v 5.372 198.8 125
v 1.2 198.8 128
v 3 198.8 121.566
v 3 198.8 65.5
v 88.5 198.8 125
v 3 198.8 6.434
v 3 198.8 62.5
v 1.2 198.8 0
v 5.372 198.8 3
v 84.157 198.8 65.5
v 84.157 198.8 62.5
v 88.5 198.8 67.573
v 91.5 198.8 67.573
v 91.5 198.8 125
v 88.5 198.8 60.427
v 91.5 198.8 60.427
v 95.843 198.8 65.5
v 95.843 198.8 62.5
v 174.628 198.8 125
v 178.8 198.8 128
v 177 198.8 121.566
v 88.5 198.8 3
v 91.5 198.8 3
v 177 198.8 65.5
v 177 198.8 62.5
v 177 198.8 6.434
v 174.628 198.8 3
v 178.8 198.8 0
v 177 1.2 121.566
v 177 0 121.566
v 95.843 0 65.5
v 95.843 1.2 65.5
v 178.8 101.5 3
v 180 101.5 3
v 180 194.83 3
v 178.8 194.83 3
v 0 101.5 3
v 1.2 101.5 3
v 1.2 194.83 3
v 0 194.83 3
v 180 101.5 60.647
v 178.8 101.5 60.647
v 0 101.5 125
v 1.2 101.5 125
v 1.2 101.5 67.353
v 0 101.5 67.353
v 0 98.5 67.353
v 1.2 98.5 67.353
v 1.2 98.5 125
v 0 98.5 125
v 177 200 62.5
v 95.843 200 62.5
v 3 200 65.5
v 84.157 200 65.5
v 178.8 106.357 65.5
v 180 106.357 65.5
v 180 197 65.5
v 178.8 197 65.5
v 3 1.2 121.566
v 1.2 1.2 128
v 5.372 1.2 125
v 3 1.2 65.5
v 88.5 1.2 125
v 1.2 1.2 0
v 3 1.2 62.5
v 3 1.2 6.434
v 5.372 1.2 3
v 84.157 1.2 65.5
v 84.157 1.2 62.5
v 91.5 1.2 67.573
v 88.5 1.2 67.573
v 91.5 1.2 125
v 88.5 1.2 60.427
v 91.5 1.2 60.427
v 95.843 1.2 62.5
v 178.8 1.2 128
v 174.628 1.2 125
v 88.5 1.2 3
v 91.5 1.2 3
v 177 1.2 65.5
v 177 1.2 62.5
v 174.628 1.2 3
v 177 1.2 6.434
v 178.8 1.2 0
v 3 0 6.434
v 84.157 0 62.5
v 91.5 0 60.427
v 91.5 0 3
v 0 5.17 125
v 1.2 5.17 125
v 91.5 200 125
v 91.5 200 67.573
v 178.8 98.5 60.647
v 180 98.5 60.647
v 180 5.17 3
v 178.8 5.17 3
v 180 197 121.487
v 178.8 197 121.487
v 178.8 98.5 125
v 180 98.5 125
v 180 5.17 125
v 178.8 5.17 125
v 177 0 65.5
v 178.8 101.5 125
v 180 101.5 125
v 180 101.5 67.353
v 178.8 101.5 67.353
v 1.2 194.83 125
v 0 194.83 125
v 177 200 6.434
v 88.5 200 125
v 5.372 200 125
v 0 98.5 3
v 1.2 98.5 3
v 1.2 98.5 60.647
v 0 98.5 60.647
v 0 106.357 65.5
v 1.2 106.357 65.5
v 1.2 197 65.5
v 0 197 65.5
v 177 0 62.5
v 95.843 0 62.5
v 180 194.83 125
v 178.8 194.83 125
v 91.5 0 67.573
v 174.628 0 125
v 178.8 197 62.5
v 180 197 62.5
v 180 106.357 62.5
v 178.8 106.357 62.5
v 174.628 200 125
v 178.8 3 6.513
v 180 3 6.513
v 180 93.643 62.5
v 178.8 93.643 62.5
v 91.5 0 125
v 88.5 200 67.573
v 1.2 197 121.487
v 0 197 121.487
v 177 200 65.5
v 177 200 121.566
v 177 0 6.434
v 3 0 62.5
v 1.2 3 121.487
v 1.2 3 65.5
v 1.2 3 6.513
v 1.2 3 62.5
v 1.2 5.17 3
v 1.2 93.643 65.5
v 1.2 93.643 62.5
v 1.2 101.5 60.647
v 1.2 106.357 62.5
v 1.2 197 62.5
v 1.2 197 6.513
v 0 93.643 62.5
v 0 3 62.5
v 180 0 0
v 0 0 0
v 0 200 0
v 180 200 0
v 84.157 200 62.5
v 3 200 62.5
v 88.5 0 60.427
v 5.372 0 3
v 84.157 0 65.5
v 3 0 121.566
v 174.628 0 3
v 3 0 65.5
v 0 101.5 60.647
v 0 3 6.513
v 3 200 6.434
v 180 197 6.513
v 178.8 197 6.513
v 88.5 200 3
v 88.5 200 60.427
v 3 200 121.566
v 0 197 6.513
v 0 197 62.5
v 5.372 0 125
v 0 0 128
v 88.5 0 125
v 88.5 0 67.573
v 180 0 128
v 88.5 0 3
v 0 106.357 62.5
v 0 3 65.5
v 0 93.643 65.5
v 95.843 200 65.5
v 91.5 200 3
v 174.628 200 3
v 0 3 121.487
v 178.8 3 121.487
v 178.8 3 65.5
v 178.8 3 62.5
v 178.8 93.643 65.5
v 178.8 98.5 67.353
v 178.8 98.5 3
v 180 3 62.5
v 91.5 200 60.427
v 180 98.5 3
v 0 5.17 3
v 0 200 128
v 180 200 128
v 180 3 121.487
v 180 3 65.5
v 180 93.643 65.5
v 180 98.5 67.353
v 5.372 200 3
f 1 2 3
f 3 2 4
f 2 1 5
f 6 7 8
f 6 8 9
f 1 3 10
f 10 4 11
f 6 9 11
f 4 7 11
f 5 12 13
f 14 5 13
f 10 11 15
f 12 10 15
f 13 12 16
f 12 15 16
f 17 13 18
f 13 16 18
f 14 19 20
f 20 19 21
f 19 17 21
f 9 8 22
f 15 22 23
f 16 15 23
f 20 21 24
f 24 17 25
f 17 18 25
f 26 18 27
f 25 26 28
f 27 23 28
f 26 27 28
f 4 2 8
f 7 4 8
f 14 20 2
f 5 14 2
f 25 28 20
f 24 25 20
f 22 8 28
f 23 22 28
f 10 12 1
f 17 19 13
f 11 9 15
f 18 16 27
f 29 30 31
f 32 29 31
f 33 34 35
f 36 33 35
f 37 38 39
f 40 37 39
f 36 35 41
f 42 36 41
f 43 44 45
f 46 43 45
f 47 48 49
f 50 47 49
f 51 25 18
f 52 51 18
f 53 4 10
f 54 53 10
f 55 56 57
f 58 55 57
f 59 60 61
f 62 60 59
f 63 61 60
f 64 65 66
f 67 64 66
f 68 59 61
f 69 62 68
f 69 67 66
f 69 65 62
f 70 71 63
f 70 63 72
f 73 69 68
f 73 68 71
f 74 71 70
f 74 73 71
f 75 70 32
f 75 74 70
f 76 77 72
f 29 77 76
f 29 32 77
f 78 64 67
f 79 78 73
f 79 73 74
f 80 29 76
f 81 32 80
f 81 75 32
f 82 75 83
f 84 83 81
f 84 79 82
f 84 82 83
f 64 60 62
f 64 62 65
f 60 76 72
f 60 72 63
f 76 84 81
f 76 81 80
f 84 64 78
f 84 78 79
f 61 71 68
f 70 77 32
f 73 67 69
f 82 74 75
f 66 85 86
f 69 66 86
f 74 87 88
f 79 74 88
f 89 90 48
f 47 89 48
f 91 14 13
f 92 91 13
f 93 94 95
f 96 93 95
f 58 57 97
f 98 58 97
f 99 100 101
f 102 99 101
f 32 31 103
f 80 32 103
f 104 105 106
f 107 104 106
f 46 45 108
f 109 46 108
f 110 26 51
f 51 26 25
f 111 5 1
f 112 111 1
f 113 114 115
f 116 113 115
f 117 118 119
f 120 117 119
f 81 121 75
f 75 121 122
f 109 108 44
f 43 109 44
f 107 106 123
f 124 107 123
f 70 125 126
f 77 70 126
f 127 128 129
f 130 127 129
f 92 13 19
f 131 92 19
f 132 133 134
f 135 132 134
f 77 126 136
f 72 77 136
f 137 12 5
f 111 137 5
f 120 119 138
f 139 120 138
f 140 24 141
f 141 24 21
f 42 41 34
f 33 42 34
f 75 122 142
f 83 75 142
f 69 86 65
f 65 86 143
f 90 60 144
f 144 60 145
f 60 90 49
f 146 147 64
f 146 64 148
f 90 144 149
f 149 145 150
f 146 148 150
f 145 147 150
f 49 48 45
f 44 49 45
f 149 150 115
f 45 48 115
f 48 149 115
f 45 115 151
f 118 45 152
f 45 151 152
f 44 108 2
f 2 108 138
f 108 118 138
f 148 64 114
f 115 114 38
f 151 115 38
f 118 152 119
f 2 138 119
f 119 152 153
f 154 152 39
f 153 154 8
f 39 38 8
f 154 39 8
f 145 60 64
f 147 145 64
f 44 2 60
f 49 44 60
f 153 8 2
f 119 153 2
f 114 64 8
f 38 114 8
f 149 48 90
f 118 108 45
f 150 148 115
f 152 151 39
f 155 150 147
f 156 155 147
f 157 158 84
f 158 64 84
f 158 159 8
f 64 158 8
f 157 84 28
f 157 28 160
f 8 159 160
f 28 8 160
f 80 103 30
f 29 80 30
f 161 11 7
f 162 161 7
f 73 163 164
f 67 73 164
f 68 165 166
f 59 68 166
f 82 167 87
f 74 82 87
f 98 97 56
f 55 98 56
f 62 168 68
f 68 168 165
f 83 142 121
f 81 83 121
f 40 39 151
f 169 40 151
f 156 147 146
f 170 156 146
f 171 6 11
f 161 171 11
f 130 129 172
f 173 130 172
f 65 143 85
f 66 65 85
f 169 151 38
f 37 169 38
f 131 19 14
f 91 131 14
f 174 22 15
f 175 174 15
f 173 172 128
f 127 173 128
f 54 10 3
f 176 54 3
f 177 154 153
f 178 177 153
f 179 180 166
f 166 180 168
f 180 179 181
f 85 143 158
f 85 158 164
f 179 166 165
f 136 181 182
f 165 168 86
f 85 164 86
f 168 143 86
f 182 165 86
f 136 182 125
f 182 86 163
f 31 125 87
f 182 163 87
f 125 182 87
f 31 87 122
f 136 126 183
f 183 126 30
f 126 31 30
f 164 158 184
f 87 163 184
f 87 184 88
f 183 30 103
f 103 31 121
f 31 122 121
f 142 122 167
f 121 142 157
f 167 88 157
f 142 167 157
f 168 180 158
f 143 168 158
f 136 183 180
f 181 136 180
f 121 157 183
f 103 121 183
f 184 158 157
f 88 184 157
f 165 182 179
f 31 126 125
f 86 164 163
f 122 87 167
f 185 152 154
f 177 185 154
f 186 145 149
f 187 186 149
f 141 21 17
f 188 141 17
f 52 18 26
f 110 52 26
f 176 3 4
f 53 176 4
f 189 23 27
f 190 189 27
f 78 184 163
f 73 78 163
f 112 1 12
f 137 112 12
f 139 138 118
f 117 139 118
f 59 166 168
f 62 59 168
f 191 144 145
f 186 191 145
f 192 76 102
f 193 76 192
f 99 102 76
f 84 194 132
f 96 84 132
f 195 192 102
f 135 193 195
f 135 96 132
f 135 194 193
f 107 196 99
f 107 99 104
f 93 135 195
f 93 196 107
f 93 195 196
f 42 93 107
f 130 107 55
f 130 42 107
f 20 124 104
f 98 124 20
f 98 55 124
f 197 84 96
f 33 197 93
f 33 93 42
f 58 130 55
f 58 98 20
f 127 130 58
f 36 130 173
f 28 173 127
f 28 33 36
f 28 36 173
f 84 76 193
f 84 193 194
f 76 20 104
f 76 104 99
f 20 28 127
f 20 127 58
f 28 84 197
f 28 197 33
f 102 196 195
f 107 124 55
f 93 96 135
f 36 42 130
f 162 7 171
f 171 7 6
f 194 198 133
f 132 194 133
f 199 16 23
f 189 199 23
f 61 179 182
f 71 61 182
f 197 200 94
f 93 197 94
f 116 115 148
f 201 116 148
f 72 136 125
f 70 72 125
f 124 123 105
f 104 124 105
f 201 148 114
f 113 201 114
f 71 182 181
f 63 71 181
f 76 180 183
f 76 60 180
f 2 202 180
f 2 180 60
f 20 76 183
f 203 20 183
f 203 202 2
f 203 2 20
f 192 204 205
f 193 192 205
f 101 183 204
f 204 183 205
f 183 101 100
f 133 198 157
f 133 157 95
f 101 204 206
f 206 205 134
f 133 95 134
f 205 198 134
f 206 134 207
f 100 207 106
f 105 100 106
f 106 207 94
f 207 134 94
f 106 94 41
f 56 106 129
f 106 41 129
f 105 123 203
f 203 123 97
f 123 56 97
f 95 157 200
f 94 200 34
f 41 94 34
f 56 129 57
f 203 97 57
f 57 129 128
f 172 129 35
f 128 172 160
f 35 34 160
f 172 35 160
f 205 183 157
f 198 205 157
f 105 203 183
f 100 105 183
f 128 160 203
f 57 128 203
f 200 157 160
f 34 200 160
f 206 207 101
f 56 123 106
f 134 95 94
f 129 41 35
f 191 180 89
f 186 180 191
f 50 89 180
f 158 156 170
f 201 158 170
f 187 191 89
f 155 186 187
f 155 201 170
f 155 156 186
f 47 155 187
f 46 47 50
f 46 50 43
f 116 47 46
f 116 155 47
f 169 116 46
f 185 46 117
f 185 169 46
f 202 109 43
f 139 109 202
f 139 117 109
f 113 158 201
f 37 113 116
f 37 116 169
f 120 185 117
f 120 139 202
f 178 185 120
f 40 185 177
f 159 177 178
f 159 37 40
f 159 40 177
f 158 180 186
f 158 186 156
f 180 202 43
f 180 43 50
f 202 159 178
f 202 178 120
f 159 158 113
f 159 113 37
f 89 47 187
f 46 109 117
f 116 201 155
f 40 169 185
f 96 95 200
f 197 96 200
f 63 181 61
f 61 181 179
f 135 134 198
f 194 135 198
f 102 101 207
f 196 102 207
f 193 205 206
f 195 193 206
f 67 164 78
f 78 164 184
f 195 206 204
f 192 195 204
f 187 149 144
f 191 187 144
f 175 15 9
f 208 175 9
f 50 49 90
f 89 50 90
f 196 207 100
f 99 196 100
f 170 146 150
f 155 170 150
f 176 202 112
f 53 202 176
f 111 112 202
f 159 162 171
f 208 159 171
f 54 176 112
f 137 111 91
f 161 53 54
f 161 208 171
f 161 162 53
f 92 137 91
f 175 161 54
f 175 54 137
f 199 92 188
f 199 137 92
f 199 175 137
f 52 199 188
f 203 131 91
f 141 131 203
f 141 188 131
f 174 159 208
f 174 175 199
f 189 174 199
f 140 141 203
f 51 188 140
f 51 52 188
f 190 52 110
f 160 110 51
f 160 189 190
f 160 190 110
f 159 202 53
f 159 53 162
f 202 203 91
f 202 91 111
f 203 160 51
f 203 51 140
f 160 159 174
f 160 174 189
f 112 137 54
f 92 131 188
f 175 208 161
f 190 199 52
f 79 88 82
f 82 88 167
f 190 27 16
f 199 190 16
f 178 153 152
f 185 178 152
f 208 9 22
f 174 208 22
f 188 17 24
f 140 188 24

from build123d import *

# Parameters (mm, degrees)
F0_W     = 180
F0_H     = 200
F0_W_2   = 177.6
F0_H_2   = 197.6
F1_DEPTH = 128
F3_DEPTH = 200.001
F5_DEPTH = 180.001


with BuildPart() as f1:
    # F0 (on Top) → F1 (new body)
    with BuildSketch(Plane.XY):
        with Locations((90, 100)):
            Rectangle(F0_W, F0_H)
        with Locations((90, 100)):
            Rectangle(F0_W_2, F0_H_2, mode=Mode.SUBTRACT)
    extrude(amount=F1_DEPTH)

    # F2 (on face) → F3 (cut, through all)
    with BuildSketch(Plane.XZ):
        Polygon((3, 121.5662565704), (3, 65.5), (84.1574190597, 65.5), align=None)
        Polygon((5.3721446832, 125), (88.5, 67.5725002305), (88.5, 125), align=None)
        Polygon((91.5, 125), (91.5, 67.5725002305), (174.6278553168, 125), align=None)
        Polygon((177, 121.5662565704), (95.8425809403, 65.5), (177, 65.5), align=None)
        Polygon((177, 62.5), (95.8425809403, 62.5), (177, 6.4337434296), align=None)
        Polygon((91.5, 60.4274997695), (91.5, 3), (174.6278553168, 3), align=None)
        Polygon((88.5, 60.4274997695), (5.3721446832, 3), (88.5, 3), align=None)
        Polygon((3, 62.5), (3, 6.4337434296), (84.1574190597, 62.5), align=None)
    extrude(amount=-F3_DEPTH, mode=Mode.SUBTRACT)

    # F4 (on face) → F5 (cut, through all)
    with BuildSketch(Plane.YZ.offset(180)):
        Polygon((3, 121.4871826042), (3, 65.5), (93.6430126453, 65.5), align=None)
        Polygon((5.1697507977, 125), (98.5, 67.3530005007), (98.5, 125), align=None)
        Polygon((101.5, 125), (101.5, 67.3530005007), (194.8302492023, 125), align=None)
        Polygon((197, 121.4871826042), (106.3569873547, 65.5), (197, 65.5), align=None)
        Polygon((197, 62.5), (106.3569873547, 62.5), (197, 6.5128173958), align=None)
        Polygon((101.5, 60.6469994993), (101.5, 3), (194.8302492023, 3), align=None)
        Polygon((98.5, 60.6469994993), (5.1697507977, 3), (98.5, 3), align=None)
        Polygon((3, 62.5), (3, 6.5128173958), (93.6430126453, 62.5), align=None)
    extrude(amount=-F5_DEPTH, mode=Mode.SUBTRACT)


solid = f1.part
